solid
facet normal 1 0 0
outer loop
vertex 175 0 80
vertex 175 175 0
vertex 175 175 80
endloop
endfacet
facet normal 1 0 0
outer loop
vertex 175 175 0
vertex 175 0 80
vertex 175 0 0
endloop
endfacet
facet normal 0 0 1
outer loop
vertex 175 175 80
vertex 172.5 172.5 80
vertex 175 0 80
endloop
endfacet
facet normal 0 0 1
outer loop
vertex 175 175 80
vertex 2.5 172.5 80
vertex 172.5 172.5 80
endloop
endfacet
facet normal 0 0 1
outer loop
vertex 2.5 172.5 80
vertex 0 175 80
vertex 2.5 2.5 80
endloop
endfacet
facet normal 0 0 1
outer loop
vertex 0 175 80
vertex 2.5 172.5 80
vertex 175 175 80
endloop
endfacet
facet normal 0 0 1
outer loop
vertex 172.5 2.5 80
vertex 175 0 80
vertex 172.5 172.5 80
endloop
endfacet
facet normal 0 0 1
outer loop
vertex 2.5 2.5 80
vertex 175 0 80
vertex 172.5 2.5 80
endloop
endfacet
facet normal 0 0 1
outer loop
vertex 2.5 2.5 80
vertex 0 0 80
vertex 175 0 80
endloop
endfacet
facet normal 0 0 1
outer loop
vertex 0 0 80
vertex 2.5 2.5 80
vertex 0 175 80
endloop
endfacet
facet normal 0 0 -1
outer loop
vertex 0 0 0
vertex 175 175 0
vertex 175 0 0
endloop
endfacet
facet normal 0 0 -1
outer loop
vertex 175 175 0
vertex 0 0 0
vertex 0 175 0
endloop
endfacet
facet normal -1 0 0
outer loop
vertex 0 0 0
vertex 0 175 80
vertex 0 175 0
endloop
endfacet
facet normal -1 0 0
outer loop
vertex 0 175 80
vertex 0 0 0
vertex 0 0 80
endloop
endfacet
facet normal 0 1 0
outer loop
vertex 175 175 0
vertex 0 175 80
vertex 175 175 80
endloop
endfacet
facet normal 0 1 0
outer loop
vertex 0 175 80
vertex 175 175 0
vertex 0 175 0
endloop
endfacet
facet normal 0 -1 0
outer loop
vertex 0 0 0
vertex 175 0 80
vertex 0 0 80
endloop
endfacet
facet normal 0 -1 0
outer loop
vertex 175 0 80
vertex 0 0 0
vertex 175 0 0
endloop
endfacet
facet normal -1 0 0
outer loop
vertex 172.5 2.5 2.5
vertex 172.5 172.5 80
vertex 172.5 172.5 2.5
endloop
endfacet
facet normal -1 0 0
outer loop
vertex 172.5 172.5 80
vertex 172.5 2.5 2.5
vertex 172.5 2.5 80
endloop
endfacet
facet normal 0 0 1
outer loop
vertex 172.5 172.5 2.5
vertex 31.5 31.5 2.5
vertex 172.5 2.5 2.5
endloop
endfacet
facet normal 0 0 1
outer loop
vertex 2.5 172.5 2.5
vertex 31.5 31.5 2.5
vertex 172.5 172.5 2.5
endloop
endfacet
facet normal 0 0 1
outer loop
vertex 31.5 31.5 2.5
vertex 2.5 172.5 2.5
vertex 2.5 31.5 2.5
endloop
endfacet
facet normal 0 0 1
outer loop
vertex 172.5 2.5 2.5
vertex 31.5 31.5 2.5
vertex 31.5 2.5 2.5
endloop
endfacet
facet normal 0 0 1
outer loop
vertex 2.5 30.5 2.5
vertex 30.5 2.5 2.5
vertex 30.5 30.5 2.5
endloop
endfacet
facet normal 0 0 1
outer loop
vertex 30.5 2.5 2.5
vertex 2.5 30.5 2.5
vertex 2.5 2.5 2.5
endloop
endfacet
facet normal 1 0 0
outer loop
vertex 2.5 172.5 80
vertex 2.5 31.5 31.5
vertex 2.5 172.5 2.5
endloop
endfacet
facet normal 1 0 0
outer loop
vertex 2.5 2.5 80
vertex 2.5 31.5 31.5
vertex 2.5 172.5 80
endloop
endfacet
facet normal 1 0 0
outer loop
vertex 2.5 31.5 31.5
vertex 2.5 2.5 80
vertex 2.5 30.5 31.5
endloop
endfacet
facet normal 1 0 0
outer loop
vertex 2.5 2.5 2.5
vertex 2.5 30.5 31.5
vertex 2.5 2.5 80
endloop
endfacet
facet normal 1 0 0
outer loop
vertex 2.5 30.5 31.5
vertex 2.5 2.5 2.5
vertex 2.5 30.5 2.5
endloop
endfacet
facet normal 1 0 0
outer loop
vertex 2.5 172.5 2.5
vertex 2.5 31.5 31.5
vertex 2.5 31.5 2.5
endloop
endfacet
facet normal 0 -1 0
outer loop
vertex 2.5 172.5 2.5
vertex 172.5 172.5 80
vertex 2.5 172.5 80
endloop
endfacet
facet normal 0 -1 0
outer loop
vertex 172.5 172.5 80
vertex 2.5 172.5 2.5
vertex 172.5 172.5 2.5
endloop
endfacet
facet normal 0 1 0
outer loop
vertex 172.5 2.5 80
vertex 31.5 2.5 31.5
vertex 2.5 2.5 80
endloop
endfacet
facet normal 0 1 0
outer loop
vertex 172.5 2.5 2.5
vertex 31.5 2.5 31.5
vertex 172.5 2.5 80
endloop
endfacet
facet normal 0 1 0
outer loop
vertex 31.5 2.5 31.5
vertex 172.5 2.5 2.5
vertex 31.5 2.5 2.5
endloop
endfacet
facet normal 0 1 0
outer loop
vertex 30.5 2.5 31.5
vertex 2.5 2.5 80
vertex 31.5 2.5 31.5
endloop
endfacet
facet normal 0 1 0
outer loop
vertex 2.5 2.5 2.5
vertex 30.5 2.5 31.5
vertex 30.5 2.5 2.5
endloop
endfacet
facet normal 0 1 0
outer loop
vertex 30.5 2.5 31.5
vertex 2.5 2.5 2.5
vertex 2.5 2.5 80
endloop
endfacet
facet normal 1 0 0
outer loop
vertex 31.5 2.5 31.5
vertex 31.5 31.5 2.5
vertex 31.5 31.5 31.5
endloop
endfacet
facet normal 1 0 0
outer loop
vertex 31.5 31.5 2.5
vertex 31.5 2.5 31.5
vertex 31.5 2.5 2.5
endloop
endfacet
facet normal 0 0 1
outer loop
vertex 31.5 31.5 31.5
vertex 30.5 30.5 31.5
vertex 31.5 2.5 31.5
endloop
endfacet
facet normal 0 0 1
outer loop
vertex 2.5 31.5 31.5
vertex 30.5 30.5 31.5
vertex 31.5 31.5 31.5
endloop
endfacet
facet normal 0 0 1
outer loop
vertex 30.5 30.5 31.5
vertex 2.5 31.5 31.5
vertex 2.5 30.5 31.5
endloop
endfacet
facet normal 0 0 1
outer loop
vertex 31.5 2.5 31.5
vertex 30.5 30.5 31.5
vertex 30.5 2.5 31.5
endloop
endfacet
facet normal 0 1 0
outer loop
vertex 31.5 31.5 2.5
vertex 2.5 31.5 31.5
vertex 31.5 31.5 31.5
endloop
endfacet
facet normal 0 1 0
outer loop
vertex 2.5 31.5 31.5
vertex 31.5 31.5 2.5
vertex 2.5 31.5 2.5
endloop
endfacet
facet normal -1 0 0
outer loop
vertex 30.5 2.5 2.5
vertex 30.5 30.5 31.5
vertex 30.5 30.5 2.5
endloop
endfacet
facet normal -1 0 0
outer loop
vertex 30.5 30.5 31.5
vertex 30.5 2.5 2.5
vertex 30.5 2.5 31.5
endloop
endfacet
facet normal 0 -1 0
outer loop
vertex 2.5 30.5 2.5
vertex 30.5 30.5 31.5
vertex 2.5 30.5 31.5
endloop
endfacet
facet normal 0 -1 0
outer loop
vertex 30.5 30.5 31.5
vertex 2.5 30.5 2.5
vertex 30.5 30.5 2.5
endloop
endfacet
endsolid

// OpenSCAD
// Thing stuff case-ifier
case_thick  =   2.5;
case_width  = 175.0;
case_height =  80.0;
inner_width = case_width - (2 * case_thick);
inner_thick =   1.0;
inner_off   = 2 * inner_thick;

module compartment(sizes, start) {
    if (start[2] != 0) {
    }
    //cube();
    translate([for (i=[0:2]) start[i] + case_thick - inner_thick])
    difference() {
        cube(sizes);
        translate([inner_thick, inner_thick, inner_thick])
        cube([sizes[0] - inner_off, sizes[1] - inner_off, case_height]);
    }
}

difference(){
    cube([case_width,case_width,case_height]);
    translate([case_thick, case_thick, case_thick])
    cube([inner_width,inner_width, case_height]);
    //compartment([30,30,30],[0,0,0]);
}

compartment([30,30,30],[0,0,0]);
